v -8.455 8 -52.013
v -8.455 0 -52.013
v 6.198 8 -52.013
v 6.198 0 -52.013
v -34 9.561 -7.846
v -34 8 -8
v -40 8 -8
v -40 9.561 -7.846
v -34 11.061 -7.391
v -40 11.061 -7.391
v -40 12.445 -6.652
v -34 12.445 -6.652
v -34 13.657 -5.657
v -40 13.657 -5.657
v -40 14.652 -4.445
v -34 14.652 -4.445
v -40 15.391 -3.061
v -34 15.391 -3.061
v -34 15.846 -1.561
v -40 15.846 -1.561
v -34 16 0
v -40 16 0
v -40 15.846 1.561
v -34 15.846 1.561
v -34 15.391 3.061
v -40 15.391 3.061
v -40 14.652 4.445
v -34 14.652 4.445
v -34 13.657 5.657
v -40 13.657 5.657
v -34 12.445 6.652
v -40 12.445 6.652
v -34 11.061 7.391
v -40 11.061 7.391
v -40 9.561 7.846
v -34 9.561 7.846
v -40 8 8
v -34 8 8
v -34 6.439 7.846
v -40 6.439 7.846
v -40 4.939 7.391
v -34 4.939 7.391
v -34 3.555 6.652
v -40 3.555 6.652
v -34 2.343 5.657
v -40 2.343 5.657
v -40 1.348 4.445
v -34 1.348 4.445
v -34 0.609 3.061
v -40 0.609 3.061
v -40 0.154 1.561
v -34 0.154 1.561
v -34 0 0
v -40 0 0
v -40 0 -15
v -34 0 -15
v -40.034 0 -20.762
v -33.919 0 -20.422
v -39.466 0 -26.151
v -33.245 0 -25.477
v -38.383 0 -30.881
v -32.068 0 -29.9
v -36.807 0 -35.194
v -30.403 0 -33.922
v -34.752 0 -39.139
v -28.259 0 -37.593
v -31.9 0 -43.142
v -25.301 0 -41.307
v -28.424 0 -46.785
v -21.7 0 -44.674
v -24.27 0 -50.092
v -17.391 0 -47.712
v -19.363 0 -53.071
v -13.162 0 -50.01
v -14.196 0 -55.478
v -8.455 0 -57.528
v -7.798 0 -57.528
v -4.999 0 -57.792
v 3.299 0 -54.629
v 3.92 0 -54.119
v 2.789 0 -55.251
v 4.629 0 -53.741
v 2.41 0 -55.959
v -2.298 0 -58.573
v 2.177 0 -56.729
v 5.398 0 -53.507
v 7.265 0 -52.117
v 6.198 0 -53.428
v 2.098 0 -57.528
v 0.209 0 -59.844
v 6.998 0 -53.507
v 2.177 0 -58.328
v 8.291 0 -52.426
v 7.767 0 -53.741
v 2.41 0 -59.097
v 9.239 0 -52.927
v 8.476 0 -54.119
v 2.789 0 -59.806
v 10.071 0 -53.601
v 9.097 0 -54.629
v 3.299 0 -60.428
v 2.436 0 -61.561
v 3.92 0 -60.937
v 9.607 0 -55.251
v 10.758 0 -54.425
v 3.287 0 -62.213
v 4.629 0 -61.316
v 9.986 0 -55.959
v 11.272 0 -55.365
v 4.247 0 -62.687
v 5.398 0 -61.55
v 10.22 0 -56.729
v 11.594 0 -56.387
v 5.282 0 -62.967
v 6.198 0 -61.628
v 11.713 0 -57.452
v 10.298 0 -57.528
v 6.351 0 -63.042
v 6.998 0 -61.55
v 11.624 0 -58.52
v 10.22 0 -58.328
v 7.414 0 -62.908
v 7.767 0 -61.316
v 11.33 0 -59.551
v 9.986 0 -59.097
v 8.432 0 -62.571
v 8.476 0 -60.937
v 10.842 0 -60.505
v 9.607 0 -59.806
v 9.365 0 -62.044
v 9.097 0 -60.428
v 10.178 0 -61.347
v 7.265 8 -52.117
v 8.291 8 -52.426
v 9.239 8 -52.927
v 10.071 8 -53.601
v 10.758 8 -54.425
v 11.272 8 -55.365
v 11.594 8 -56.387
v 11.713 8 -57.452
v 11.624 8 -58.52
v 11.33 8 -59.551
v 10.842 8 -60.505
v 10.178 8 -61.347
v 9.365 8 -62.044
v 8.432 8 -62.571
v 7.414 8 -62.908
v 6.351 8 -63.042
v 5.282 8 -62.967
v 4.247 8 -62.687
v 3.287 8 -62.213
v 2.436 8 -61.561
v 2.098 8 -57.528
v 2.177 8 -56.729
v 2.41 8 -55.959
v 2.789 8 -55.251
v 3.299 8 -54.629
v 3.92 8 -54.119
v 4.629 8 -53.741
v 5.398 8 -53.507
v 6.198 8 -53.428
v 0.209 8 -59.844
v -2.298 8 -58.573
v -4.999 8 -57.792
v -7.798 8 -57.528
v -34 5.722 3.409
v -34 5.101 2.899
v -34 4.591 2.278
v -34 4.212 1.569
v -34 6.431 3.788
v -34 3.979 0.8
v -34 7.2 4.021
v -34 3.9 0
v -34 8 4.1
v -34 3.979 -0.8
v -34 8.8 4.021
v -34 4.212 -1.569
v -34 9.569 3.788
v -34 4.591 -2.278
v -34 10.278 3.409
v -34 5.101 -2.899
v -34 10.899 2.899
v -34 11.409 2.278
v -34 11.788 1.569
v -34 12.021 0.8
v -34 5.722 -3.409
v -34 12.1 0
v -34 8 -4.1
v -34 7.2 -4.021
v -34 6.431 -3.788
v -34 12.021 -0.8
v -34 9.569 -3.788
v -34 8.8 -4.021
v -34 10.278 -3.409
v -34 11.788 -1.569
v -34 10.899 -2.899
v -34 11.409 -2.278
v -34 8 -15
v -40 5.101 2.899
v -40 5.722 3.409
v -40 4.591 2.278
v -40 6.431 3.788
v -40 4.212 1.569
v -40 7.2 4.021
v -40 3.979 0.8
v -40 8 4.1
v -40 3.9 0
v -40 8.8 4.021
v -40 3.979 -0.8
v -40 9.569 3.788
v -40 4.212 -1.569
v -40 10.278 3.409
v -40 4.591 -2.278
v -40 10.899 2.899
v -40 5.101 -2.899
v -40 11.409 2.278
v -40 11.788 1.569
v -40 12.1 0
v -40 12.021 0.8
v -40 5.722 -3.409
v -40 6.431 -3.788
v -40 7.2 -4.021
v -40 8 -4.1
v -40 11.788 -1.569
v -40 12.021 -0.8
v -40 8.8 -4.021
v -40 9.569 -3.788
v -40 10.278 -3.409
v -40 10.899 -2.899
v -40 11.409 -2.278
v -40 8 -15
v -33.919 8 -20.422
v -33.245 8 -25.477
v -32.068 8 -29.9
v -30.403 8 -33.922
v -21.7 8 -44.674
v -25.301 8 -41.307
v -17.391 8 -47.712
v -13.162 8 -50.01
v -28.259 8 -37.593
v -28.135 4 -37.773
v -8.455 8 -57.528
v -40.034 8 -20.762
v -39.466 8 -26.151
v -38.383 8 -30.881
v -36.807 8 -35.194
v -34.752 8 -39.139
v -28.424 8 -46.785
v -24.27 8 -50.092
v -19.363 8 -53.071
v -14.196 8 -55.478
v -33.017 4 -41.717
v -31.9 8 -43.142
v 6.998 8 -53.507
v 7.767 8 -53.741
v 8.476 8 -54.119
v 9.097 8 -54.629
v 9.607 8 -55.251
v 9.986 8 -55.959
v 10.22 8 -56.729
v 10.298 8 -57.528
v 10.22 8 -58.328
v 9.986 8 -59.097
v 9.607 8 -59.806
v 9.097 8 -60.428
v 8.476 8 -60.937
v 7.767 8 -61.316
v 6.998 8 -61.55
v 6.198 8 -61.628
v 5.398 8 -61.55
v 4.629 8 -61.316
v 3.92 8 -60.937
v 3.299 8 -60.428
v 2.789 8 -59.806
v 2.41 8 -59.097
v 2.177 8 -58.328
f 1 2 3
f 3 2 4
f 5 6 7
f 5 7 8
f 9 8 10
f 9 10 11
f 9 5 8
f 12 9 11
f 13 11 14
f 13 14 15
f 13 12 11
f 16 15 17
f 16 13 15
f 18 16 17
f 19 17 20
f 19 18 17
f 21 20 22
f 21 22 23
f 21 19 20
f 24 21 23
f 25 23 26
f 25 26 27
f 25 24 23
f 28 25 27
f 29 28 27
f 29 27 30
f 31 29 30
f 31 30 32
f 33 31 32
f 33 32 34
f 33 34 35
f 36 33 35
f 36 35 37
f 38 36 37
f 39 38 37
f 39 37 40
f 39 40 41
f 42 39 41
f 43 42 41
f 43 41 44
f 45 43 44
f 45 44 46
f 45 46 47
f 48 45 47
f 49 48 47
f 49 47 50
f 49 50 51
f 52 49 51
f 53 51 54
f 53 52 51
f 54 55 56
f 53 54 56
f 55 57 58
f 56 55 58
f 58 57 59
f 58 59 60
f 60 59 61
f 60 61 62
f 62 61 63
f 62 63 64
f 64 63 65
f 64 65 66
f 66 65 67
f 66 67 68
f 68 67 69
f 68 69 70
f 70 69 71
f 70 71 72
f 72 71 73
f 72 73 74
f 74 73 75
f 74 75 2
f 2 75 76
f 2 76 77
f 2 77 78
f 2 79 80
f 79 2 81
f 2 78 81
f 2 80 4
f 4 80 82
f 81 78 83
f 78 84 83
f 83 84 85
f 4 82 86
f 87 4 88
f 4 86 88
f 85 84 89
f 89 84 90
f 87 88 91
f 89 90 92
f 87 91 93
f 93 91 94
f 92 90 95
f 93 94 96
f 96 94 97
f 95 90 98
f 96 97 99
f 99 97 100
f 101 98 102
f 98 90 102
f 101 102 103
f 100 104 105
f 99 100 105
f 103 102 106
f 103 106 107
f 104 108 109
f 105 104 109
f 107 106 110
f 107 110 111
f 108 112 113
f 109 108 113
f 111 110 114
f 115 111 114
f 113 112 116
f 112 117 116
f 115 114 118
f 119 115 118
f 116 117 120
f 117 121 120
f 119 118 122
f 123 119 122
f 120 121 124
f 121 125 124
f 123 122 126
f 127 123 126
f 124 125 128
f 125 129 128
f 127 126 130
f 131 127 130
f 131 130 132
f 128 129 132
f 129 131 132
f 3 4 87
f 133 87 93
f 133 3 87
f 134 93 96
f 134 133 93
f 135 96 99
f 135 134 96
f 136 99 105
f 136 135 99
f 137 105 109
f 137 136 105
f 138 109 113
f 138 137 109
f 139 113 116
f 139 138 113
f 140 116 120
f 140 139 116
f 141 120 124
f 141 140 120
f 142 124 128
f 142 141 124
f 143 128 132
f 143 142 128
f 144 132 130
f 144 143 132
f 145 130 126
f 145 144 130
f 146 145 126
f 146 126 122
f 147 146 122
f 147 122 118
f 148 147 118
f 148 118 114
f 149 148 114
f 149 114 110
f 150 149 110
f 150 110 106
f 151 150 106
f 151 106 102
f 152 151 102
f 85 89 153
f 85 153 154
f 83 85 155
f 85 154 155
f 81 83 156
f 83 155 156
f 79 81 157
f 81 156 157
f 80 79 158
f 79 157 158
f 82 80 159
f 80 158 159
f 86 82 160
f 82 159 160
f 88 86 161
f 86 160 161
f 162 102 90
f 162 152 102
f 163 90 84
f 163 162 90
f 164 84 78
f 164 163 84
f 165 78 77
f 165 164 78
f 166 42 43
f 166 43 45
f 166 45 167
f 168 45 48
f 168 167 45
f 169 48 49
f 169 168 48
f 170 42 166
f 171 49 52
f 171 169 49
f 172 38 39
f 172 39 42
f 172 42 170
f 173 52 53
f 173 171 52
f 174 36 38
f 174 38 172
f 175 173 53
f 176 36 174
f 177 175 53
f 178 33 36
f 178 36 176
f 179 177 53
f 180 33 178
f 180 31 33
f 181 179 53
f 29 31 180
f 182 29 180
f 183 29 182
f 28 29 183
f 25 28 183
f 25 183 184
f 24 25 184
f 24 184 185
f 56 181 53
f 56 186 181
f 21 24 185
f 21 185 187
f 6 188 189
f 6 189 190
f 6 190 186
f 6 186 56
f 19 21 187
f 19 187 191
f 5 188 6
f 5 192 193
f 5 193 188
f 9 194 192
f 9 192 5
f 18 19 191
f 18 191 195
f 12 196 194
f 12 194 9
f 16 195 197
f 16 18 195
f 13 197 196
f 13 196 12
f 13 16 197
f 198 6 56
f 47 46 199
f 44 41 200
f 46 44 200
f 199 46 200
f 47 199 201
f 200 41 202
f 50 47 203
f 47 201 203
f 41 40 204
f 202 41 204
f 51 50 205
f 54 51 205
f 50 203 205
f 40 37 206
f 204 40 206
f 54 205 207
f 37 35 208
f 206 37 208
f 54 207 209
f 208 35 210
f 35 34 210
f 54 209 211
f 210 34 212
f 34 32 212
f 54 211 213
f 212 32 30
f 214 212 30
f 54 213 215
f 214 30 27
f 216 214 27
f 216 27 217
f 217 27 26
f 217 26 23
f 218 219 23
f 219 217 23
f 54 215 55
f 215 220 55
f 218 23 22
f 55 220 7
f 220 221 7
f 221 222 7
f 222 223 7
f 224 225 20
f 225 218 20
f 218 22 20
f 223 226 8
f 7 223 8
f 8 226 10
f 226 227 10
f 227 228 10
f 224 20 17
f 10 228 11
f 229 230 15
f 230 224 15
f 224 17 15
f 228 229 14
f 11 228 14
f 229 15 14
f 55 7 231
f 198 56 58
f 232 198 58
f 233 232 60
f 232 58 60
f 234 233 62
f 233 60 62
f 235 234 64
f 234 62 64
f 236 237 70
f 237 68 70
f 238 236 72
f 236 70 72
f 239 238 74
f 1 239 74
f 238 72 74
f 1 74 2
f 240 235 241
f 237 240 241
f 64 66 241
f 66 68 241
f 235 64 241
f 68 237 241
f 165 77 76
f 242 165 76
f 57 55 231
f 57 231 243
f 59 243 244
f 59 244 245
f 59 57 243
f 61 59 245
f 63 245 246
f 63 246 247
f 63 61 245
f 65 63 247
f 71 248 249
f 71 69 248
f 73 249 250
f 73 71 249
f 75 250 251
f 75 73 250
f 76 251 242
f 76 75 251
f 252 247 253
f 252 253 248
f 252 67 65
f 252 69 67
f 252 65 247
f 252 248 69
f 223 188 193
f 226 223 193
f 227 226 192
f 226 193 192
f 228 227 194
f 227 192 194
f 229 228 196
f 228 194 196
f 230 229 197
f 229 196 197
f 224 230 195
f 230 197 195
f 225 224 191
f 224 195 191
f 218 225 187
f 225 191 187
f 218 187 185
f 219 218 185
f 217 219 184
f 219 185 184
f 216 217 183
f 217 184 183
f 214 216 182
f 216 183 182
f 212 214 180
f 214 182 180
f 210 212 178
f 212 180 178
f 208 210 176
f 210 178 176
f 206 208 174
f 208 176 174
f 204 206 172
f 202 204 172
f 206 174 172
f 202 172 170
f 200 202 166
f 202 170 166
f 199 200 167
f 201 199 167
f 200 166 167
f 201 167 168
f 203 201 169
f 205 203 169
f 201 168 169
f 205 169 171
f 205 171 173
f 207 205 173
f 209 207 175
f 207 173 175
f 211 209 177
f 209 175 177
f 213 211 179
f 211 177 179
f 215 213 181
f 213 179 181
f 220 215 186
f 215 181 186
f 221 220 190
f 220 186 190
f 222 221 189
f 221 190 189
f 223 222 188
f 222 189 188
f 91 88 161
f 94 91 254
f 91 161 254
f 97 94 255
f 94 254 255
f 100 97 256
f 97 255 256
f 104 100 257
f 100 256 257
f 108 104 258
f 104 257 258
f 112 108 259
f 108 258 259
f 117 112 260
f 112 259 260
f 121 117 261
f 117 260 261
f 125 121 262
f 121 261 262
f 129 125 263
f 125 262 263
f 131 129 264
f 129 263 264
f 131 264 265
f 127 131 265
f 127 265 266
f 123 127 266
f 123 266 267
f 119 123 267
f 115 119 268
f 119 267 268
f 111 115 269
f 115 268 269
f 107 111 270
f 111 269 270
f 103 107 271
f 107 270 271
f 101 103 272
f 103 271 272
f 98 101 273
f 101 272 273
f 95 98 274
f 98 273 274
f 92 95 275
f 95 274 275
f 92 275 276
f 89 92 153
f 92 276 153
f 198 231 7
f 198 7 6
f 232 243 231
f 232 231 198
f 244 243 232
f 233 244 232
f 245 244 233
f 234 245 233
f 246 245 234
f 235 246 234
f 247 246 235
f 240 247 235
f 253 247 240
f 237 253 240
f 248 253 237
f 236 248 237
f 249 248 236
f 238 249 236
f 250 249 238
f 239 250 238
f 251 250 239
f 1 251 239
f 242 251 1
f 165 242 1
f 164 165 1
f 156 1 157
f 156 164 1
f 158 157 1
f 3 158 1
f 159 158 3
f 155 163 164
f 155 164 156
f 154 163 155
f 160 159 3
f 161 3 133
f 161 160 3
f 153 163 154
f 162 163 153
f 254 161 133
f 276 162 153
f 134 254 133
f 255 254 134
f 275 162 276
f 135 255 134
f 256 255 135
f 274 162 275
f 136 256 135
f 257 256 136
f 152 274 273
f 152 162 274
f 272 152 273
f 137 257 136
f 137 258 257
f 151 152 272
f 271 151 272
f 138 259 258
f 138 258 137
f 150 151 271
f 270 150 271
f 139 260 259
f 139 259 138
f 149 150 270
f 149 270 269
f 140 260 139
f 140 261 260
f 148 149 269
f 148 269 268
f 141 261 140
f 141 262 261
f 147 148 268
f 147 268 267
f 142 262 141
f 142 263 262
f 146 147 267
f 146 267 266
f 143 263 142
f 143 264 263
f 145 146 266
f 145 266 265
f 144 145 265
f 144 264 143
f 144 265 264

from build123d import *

# Parameters (mm, degrees)
RESSALTO_EXTRUS_O4_DEPTH = 8
ESBO_O7_R                = 4.1
CORTE_EXTRUS_O3_DEPTH    = 8
ESBO_O8_R                = 8
ESBO_O8_R_2              = 4.1
RESSALTO_EXTRUS_O5_DEPTH = 6
ESBO_O14_R               = 5.515467334
ESBO_O14_R_2             = 4.1
RESSALTO_EXTRUS_O8_DEPTH = 8
FILETE3_R                = 15
CORTE_EXTRUS_O6_DEPTH    = 8


with BuildPart() as part:
    # Esboço1 → Ressalto-extrusão4 (new body)
    with BuildSketch(Plane(origin=(0, 0, 0), x_dir=(1, 0, 0), z_dir=(0, 1, 0))):
        with BuildLine():
            Line((-8.455093814, 52.012944842), (6.19830879, 52.012944842))
            Line((6.19830879, 52.012944842), (6.19830879, 57.528412176))
            Line((6.19830879, 57.528412176), (-8.455093814, 57.528412176))
            add(Edge.make_bspline(
                [(-40, 15), (-41.806500993, 47.170631402), (-8.455093814, 57.528412176)],
                knots=[0, 0, 0, 1, 1, 1], degree=2))
            Line((-40, 15), (-40, 0))
            Line((-40, 0), (-34, 0))
            Line((-34, 0), (-34, 15))
            add(Edge.make_bspline(
                [(-34, 15), (-35.042952492, 42.040177947), (-8.455093814, 52.012944842)],
                knots=[0, 0, 0, 1, 1, 1], degree=2))
        make_face()
    extrude(amount=RESSALTO_EXTRUS_O4_DEPTH)

    # Esboço7 → Corte-extrusão3 (cut)
    with BuildSketch(Plane(origin=(-34, 0, 0), x_dir=(0, 0, -1), z_dir=(1, 0, 0))):
        with Locations((0, 8)):
            Circle(ESBO_O7_R)
    extrude(amount=-CORTE_EXTRUS_O3_DEPTH, mode=Mode.SUBTRACT)

    # Esboço8 → Ressalto-extrusão5 (add)
    with BuildSketch(Plane(origin=(-34, 0, 0), x_dir=(0, 0, -1), z_dir=(1, 0, 0))):
        with Locations((0, 8)):
            Circle(ESBO_O8_R)
        with Locations((0, 8)):
            Circle(ESBO_O8_R_2, mode=Mode.SUBTRACT)
    extrude(amount=-RESSALTO_EXTRUS_O5_DEPTH)

    # Esboço14 → Ressalto-extrusão8 (add)
    with BuildSketch(Plane(origin=(0, 8, 0), x_dir=(1, 0, 0), z_dir=(0, 1, 0))):
        with Locations((6.19830879, 57.528412176)):
            Circle(ESBO_O14_R)
        with Locations((6.19830879, 57.528412176)):
            Circle(ESBO_O14_R_2, mode=Mode.SUBTRACT)
    extrude(amount=-RESSALTO_EXTRUS_O8_DEPTH)

    # Filete3
    filete3_edges = [part.edges().sort_by_distance(p)[0] for p in [
        (0.682841456, 4, -57.528412176),
    ]]
    fillet(filete3_edges, radius=FILETE3_R)

    # Esboço15 → Corte-extrusão6 (cut)
    with BuildSketch(Plane(origin=(0, 8, 0), x_dir=(1, 0, 0), z_dir=(0, 1, 0))):
        with BuildLine():
            Line((6.19830879, 57.528412176), (2.09830879, 57.528412176))
            ThreePointArc((2.09830879, 57.528412176), (3.299170987, 54.629274373), (6.19830879, 53.428412176))
            Line((6.19830879, 53.428412176), (6.19830879, 57.528412176))
        make_face()
    extrude(amount=-CORTE_EXTRUS_O6_DEPTH, mode=Mode.SUBTRACT)


solid = part.part
